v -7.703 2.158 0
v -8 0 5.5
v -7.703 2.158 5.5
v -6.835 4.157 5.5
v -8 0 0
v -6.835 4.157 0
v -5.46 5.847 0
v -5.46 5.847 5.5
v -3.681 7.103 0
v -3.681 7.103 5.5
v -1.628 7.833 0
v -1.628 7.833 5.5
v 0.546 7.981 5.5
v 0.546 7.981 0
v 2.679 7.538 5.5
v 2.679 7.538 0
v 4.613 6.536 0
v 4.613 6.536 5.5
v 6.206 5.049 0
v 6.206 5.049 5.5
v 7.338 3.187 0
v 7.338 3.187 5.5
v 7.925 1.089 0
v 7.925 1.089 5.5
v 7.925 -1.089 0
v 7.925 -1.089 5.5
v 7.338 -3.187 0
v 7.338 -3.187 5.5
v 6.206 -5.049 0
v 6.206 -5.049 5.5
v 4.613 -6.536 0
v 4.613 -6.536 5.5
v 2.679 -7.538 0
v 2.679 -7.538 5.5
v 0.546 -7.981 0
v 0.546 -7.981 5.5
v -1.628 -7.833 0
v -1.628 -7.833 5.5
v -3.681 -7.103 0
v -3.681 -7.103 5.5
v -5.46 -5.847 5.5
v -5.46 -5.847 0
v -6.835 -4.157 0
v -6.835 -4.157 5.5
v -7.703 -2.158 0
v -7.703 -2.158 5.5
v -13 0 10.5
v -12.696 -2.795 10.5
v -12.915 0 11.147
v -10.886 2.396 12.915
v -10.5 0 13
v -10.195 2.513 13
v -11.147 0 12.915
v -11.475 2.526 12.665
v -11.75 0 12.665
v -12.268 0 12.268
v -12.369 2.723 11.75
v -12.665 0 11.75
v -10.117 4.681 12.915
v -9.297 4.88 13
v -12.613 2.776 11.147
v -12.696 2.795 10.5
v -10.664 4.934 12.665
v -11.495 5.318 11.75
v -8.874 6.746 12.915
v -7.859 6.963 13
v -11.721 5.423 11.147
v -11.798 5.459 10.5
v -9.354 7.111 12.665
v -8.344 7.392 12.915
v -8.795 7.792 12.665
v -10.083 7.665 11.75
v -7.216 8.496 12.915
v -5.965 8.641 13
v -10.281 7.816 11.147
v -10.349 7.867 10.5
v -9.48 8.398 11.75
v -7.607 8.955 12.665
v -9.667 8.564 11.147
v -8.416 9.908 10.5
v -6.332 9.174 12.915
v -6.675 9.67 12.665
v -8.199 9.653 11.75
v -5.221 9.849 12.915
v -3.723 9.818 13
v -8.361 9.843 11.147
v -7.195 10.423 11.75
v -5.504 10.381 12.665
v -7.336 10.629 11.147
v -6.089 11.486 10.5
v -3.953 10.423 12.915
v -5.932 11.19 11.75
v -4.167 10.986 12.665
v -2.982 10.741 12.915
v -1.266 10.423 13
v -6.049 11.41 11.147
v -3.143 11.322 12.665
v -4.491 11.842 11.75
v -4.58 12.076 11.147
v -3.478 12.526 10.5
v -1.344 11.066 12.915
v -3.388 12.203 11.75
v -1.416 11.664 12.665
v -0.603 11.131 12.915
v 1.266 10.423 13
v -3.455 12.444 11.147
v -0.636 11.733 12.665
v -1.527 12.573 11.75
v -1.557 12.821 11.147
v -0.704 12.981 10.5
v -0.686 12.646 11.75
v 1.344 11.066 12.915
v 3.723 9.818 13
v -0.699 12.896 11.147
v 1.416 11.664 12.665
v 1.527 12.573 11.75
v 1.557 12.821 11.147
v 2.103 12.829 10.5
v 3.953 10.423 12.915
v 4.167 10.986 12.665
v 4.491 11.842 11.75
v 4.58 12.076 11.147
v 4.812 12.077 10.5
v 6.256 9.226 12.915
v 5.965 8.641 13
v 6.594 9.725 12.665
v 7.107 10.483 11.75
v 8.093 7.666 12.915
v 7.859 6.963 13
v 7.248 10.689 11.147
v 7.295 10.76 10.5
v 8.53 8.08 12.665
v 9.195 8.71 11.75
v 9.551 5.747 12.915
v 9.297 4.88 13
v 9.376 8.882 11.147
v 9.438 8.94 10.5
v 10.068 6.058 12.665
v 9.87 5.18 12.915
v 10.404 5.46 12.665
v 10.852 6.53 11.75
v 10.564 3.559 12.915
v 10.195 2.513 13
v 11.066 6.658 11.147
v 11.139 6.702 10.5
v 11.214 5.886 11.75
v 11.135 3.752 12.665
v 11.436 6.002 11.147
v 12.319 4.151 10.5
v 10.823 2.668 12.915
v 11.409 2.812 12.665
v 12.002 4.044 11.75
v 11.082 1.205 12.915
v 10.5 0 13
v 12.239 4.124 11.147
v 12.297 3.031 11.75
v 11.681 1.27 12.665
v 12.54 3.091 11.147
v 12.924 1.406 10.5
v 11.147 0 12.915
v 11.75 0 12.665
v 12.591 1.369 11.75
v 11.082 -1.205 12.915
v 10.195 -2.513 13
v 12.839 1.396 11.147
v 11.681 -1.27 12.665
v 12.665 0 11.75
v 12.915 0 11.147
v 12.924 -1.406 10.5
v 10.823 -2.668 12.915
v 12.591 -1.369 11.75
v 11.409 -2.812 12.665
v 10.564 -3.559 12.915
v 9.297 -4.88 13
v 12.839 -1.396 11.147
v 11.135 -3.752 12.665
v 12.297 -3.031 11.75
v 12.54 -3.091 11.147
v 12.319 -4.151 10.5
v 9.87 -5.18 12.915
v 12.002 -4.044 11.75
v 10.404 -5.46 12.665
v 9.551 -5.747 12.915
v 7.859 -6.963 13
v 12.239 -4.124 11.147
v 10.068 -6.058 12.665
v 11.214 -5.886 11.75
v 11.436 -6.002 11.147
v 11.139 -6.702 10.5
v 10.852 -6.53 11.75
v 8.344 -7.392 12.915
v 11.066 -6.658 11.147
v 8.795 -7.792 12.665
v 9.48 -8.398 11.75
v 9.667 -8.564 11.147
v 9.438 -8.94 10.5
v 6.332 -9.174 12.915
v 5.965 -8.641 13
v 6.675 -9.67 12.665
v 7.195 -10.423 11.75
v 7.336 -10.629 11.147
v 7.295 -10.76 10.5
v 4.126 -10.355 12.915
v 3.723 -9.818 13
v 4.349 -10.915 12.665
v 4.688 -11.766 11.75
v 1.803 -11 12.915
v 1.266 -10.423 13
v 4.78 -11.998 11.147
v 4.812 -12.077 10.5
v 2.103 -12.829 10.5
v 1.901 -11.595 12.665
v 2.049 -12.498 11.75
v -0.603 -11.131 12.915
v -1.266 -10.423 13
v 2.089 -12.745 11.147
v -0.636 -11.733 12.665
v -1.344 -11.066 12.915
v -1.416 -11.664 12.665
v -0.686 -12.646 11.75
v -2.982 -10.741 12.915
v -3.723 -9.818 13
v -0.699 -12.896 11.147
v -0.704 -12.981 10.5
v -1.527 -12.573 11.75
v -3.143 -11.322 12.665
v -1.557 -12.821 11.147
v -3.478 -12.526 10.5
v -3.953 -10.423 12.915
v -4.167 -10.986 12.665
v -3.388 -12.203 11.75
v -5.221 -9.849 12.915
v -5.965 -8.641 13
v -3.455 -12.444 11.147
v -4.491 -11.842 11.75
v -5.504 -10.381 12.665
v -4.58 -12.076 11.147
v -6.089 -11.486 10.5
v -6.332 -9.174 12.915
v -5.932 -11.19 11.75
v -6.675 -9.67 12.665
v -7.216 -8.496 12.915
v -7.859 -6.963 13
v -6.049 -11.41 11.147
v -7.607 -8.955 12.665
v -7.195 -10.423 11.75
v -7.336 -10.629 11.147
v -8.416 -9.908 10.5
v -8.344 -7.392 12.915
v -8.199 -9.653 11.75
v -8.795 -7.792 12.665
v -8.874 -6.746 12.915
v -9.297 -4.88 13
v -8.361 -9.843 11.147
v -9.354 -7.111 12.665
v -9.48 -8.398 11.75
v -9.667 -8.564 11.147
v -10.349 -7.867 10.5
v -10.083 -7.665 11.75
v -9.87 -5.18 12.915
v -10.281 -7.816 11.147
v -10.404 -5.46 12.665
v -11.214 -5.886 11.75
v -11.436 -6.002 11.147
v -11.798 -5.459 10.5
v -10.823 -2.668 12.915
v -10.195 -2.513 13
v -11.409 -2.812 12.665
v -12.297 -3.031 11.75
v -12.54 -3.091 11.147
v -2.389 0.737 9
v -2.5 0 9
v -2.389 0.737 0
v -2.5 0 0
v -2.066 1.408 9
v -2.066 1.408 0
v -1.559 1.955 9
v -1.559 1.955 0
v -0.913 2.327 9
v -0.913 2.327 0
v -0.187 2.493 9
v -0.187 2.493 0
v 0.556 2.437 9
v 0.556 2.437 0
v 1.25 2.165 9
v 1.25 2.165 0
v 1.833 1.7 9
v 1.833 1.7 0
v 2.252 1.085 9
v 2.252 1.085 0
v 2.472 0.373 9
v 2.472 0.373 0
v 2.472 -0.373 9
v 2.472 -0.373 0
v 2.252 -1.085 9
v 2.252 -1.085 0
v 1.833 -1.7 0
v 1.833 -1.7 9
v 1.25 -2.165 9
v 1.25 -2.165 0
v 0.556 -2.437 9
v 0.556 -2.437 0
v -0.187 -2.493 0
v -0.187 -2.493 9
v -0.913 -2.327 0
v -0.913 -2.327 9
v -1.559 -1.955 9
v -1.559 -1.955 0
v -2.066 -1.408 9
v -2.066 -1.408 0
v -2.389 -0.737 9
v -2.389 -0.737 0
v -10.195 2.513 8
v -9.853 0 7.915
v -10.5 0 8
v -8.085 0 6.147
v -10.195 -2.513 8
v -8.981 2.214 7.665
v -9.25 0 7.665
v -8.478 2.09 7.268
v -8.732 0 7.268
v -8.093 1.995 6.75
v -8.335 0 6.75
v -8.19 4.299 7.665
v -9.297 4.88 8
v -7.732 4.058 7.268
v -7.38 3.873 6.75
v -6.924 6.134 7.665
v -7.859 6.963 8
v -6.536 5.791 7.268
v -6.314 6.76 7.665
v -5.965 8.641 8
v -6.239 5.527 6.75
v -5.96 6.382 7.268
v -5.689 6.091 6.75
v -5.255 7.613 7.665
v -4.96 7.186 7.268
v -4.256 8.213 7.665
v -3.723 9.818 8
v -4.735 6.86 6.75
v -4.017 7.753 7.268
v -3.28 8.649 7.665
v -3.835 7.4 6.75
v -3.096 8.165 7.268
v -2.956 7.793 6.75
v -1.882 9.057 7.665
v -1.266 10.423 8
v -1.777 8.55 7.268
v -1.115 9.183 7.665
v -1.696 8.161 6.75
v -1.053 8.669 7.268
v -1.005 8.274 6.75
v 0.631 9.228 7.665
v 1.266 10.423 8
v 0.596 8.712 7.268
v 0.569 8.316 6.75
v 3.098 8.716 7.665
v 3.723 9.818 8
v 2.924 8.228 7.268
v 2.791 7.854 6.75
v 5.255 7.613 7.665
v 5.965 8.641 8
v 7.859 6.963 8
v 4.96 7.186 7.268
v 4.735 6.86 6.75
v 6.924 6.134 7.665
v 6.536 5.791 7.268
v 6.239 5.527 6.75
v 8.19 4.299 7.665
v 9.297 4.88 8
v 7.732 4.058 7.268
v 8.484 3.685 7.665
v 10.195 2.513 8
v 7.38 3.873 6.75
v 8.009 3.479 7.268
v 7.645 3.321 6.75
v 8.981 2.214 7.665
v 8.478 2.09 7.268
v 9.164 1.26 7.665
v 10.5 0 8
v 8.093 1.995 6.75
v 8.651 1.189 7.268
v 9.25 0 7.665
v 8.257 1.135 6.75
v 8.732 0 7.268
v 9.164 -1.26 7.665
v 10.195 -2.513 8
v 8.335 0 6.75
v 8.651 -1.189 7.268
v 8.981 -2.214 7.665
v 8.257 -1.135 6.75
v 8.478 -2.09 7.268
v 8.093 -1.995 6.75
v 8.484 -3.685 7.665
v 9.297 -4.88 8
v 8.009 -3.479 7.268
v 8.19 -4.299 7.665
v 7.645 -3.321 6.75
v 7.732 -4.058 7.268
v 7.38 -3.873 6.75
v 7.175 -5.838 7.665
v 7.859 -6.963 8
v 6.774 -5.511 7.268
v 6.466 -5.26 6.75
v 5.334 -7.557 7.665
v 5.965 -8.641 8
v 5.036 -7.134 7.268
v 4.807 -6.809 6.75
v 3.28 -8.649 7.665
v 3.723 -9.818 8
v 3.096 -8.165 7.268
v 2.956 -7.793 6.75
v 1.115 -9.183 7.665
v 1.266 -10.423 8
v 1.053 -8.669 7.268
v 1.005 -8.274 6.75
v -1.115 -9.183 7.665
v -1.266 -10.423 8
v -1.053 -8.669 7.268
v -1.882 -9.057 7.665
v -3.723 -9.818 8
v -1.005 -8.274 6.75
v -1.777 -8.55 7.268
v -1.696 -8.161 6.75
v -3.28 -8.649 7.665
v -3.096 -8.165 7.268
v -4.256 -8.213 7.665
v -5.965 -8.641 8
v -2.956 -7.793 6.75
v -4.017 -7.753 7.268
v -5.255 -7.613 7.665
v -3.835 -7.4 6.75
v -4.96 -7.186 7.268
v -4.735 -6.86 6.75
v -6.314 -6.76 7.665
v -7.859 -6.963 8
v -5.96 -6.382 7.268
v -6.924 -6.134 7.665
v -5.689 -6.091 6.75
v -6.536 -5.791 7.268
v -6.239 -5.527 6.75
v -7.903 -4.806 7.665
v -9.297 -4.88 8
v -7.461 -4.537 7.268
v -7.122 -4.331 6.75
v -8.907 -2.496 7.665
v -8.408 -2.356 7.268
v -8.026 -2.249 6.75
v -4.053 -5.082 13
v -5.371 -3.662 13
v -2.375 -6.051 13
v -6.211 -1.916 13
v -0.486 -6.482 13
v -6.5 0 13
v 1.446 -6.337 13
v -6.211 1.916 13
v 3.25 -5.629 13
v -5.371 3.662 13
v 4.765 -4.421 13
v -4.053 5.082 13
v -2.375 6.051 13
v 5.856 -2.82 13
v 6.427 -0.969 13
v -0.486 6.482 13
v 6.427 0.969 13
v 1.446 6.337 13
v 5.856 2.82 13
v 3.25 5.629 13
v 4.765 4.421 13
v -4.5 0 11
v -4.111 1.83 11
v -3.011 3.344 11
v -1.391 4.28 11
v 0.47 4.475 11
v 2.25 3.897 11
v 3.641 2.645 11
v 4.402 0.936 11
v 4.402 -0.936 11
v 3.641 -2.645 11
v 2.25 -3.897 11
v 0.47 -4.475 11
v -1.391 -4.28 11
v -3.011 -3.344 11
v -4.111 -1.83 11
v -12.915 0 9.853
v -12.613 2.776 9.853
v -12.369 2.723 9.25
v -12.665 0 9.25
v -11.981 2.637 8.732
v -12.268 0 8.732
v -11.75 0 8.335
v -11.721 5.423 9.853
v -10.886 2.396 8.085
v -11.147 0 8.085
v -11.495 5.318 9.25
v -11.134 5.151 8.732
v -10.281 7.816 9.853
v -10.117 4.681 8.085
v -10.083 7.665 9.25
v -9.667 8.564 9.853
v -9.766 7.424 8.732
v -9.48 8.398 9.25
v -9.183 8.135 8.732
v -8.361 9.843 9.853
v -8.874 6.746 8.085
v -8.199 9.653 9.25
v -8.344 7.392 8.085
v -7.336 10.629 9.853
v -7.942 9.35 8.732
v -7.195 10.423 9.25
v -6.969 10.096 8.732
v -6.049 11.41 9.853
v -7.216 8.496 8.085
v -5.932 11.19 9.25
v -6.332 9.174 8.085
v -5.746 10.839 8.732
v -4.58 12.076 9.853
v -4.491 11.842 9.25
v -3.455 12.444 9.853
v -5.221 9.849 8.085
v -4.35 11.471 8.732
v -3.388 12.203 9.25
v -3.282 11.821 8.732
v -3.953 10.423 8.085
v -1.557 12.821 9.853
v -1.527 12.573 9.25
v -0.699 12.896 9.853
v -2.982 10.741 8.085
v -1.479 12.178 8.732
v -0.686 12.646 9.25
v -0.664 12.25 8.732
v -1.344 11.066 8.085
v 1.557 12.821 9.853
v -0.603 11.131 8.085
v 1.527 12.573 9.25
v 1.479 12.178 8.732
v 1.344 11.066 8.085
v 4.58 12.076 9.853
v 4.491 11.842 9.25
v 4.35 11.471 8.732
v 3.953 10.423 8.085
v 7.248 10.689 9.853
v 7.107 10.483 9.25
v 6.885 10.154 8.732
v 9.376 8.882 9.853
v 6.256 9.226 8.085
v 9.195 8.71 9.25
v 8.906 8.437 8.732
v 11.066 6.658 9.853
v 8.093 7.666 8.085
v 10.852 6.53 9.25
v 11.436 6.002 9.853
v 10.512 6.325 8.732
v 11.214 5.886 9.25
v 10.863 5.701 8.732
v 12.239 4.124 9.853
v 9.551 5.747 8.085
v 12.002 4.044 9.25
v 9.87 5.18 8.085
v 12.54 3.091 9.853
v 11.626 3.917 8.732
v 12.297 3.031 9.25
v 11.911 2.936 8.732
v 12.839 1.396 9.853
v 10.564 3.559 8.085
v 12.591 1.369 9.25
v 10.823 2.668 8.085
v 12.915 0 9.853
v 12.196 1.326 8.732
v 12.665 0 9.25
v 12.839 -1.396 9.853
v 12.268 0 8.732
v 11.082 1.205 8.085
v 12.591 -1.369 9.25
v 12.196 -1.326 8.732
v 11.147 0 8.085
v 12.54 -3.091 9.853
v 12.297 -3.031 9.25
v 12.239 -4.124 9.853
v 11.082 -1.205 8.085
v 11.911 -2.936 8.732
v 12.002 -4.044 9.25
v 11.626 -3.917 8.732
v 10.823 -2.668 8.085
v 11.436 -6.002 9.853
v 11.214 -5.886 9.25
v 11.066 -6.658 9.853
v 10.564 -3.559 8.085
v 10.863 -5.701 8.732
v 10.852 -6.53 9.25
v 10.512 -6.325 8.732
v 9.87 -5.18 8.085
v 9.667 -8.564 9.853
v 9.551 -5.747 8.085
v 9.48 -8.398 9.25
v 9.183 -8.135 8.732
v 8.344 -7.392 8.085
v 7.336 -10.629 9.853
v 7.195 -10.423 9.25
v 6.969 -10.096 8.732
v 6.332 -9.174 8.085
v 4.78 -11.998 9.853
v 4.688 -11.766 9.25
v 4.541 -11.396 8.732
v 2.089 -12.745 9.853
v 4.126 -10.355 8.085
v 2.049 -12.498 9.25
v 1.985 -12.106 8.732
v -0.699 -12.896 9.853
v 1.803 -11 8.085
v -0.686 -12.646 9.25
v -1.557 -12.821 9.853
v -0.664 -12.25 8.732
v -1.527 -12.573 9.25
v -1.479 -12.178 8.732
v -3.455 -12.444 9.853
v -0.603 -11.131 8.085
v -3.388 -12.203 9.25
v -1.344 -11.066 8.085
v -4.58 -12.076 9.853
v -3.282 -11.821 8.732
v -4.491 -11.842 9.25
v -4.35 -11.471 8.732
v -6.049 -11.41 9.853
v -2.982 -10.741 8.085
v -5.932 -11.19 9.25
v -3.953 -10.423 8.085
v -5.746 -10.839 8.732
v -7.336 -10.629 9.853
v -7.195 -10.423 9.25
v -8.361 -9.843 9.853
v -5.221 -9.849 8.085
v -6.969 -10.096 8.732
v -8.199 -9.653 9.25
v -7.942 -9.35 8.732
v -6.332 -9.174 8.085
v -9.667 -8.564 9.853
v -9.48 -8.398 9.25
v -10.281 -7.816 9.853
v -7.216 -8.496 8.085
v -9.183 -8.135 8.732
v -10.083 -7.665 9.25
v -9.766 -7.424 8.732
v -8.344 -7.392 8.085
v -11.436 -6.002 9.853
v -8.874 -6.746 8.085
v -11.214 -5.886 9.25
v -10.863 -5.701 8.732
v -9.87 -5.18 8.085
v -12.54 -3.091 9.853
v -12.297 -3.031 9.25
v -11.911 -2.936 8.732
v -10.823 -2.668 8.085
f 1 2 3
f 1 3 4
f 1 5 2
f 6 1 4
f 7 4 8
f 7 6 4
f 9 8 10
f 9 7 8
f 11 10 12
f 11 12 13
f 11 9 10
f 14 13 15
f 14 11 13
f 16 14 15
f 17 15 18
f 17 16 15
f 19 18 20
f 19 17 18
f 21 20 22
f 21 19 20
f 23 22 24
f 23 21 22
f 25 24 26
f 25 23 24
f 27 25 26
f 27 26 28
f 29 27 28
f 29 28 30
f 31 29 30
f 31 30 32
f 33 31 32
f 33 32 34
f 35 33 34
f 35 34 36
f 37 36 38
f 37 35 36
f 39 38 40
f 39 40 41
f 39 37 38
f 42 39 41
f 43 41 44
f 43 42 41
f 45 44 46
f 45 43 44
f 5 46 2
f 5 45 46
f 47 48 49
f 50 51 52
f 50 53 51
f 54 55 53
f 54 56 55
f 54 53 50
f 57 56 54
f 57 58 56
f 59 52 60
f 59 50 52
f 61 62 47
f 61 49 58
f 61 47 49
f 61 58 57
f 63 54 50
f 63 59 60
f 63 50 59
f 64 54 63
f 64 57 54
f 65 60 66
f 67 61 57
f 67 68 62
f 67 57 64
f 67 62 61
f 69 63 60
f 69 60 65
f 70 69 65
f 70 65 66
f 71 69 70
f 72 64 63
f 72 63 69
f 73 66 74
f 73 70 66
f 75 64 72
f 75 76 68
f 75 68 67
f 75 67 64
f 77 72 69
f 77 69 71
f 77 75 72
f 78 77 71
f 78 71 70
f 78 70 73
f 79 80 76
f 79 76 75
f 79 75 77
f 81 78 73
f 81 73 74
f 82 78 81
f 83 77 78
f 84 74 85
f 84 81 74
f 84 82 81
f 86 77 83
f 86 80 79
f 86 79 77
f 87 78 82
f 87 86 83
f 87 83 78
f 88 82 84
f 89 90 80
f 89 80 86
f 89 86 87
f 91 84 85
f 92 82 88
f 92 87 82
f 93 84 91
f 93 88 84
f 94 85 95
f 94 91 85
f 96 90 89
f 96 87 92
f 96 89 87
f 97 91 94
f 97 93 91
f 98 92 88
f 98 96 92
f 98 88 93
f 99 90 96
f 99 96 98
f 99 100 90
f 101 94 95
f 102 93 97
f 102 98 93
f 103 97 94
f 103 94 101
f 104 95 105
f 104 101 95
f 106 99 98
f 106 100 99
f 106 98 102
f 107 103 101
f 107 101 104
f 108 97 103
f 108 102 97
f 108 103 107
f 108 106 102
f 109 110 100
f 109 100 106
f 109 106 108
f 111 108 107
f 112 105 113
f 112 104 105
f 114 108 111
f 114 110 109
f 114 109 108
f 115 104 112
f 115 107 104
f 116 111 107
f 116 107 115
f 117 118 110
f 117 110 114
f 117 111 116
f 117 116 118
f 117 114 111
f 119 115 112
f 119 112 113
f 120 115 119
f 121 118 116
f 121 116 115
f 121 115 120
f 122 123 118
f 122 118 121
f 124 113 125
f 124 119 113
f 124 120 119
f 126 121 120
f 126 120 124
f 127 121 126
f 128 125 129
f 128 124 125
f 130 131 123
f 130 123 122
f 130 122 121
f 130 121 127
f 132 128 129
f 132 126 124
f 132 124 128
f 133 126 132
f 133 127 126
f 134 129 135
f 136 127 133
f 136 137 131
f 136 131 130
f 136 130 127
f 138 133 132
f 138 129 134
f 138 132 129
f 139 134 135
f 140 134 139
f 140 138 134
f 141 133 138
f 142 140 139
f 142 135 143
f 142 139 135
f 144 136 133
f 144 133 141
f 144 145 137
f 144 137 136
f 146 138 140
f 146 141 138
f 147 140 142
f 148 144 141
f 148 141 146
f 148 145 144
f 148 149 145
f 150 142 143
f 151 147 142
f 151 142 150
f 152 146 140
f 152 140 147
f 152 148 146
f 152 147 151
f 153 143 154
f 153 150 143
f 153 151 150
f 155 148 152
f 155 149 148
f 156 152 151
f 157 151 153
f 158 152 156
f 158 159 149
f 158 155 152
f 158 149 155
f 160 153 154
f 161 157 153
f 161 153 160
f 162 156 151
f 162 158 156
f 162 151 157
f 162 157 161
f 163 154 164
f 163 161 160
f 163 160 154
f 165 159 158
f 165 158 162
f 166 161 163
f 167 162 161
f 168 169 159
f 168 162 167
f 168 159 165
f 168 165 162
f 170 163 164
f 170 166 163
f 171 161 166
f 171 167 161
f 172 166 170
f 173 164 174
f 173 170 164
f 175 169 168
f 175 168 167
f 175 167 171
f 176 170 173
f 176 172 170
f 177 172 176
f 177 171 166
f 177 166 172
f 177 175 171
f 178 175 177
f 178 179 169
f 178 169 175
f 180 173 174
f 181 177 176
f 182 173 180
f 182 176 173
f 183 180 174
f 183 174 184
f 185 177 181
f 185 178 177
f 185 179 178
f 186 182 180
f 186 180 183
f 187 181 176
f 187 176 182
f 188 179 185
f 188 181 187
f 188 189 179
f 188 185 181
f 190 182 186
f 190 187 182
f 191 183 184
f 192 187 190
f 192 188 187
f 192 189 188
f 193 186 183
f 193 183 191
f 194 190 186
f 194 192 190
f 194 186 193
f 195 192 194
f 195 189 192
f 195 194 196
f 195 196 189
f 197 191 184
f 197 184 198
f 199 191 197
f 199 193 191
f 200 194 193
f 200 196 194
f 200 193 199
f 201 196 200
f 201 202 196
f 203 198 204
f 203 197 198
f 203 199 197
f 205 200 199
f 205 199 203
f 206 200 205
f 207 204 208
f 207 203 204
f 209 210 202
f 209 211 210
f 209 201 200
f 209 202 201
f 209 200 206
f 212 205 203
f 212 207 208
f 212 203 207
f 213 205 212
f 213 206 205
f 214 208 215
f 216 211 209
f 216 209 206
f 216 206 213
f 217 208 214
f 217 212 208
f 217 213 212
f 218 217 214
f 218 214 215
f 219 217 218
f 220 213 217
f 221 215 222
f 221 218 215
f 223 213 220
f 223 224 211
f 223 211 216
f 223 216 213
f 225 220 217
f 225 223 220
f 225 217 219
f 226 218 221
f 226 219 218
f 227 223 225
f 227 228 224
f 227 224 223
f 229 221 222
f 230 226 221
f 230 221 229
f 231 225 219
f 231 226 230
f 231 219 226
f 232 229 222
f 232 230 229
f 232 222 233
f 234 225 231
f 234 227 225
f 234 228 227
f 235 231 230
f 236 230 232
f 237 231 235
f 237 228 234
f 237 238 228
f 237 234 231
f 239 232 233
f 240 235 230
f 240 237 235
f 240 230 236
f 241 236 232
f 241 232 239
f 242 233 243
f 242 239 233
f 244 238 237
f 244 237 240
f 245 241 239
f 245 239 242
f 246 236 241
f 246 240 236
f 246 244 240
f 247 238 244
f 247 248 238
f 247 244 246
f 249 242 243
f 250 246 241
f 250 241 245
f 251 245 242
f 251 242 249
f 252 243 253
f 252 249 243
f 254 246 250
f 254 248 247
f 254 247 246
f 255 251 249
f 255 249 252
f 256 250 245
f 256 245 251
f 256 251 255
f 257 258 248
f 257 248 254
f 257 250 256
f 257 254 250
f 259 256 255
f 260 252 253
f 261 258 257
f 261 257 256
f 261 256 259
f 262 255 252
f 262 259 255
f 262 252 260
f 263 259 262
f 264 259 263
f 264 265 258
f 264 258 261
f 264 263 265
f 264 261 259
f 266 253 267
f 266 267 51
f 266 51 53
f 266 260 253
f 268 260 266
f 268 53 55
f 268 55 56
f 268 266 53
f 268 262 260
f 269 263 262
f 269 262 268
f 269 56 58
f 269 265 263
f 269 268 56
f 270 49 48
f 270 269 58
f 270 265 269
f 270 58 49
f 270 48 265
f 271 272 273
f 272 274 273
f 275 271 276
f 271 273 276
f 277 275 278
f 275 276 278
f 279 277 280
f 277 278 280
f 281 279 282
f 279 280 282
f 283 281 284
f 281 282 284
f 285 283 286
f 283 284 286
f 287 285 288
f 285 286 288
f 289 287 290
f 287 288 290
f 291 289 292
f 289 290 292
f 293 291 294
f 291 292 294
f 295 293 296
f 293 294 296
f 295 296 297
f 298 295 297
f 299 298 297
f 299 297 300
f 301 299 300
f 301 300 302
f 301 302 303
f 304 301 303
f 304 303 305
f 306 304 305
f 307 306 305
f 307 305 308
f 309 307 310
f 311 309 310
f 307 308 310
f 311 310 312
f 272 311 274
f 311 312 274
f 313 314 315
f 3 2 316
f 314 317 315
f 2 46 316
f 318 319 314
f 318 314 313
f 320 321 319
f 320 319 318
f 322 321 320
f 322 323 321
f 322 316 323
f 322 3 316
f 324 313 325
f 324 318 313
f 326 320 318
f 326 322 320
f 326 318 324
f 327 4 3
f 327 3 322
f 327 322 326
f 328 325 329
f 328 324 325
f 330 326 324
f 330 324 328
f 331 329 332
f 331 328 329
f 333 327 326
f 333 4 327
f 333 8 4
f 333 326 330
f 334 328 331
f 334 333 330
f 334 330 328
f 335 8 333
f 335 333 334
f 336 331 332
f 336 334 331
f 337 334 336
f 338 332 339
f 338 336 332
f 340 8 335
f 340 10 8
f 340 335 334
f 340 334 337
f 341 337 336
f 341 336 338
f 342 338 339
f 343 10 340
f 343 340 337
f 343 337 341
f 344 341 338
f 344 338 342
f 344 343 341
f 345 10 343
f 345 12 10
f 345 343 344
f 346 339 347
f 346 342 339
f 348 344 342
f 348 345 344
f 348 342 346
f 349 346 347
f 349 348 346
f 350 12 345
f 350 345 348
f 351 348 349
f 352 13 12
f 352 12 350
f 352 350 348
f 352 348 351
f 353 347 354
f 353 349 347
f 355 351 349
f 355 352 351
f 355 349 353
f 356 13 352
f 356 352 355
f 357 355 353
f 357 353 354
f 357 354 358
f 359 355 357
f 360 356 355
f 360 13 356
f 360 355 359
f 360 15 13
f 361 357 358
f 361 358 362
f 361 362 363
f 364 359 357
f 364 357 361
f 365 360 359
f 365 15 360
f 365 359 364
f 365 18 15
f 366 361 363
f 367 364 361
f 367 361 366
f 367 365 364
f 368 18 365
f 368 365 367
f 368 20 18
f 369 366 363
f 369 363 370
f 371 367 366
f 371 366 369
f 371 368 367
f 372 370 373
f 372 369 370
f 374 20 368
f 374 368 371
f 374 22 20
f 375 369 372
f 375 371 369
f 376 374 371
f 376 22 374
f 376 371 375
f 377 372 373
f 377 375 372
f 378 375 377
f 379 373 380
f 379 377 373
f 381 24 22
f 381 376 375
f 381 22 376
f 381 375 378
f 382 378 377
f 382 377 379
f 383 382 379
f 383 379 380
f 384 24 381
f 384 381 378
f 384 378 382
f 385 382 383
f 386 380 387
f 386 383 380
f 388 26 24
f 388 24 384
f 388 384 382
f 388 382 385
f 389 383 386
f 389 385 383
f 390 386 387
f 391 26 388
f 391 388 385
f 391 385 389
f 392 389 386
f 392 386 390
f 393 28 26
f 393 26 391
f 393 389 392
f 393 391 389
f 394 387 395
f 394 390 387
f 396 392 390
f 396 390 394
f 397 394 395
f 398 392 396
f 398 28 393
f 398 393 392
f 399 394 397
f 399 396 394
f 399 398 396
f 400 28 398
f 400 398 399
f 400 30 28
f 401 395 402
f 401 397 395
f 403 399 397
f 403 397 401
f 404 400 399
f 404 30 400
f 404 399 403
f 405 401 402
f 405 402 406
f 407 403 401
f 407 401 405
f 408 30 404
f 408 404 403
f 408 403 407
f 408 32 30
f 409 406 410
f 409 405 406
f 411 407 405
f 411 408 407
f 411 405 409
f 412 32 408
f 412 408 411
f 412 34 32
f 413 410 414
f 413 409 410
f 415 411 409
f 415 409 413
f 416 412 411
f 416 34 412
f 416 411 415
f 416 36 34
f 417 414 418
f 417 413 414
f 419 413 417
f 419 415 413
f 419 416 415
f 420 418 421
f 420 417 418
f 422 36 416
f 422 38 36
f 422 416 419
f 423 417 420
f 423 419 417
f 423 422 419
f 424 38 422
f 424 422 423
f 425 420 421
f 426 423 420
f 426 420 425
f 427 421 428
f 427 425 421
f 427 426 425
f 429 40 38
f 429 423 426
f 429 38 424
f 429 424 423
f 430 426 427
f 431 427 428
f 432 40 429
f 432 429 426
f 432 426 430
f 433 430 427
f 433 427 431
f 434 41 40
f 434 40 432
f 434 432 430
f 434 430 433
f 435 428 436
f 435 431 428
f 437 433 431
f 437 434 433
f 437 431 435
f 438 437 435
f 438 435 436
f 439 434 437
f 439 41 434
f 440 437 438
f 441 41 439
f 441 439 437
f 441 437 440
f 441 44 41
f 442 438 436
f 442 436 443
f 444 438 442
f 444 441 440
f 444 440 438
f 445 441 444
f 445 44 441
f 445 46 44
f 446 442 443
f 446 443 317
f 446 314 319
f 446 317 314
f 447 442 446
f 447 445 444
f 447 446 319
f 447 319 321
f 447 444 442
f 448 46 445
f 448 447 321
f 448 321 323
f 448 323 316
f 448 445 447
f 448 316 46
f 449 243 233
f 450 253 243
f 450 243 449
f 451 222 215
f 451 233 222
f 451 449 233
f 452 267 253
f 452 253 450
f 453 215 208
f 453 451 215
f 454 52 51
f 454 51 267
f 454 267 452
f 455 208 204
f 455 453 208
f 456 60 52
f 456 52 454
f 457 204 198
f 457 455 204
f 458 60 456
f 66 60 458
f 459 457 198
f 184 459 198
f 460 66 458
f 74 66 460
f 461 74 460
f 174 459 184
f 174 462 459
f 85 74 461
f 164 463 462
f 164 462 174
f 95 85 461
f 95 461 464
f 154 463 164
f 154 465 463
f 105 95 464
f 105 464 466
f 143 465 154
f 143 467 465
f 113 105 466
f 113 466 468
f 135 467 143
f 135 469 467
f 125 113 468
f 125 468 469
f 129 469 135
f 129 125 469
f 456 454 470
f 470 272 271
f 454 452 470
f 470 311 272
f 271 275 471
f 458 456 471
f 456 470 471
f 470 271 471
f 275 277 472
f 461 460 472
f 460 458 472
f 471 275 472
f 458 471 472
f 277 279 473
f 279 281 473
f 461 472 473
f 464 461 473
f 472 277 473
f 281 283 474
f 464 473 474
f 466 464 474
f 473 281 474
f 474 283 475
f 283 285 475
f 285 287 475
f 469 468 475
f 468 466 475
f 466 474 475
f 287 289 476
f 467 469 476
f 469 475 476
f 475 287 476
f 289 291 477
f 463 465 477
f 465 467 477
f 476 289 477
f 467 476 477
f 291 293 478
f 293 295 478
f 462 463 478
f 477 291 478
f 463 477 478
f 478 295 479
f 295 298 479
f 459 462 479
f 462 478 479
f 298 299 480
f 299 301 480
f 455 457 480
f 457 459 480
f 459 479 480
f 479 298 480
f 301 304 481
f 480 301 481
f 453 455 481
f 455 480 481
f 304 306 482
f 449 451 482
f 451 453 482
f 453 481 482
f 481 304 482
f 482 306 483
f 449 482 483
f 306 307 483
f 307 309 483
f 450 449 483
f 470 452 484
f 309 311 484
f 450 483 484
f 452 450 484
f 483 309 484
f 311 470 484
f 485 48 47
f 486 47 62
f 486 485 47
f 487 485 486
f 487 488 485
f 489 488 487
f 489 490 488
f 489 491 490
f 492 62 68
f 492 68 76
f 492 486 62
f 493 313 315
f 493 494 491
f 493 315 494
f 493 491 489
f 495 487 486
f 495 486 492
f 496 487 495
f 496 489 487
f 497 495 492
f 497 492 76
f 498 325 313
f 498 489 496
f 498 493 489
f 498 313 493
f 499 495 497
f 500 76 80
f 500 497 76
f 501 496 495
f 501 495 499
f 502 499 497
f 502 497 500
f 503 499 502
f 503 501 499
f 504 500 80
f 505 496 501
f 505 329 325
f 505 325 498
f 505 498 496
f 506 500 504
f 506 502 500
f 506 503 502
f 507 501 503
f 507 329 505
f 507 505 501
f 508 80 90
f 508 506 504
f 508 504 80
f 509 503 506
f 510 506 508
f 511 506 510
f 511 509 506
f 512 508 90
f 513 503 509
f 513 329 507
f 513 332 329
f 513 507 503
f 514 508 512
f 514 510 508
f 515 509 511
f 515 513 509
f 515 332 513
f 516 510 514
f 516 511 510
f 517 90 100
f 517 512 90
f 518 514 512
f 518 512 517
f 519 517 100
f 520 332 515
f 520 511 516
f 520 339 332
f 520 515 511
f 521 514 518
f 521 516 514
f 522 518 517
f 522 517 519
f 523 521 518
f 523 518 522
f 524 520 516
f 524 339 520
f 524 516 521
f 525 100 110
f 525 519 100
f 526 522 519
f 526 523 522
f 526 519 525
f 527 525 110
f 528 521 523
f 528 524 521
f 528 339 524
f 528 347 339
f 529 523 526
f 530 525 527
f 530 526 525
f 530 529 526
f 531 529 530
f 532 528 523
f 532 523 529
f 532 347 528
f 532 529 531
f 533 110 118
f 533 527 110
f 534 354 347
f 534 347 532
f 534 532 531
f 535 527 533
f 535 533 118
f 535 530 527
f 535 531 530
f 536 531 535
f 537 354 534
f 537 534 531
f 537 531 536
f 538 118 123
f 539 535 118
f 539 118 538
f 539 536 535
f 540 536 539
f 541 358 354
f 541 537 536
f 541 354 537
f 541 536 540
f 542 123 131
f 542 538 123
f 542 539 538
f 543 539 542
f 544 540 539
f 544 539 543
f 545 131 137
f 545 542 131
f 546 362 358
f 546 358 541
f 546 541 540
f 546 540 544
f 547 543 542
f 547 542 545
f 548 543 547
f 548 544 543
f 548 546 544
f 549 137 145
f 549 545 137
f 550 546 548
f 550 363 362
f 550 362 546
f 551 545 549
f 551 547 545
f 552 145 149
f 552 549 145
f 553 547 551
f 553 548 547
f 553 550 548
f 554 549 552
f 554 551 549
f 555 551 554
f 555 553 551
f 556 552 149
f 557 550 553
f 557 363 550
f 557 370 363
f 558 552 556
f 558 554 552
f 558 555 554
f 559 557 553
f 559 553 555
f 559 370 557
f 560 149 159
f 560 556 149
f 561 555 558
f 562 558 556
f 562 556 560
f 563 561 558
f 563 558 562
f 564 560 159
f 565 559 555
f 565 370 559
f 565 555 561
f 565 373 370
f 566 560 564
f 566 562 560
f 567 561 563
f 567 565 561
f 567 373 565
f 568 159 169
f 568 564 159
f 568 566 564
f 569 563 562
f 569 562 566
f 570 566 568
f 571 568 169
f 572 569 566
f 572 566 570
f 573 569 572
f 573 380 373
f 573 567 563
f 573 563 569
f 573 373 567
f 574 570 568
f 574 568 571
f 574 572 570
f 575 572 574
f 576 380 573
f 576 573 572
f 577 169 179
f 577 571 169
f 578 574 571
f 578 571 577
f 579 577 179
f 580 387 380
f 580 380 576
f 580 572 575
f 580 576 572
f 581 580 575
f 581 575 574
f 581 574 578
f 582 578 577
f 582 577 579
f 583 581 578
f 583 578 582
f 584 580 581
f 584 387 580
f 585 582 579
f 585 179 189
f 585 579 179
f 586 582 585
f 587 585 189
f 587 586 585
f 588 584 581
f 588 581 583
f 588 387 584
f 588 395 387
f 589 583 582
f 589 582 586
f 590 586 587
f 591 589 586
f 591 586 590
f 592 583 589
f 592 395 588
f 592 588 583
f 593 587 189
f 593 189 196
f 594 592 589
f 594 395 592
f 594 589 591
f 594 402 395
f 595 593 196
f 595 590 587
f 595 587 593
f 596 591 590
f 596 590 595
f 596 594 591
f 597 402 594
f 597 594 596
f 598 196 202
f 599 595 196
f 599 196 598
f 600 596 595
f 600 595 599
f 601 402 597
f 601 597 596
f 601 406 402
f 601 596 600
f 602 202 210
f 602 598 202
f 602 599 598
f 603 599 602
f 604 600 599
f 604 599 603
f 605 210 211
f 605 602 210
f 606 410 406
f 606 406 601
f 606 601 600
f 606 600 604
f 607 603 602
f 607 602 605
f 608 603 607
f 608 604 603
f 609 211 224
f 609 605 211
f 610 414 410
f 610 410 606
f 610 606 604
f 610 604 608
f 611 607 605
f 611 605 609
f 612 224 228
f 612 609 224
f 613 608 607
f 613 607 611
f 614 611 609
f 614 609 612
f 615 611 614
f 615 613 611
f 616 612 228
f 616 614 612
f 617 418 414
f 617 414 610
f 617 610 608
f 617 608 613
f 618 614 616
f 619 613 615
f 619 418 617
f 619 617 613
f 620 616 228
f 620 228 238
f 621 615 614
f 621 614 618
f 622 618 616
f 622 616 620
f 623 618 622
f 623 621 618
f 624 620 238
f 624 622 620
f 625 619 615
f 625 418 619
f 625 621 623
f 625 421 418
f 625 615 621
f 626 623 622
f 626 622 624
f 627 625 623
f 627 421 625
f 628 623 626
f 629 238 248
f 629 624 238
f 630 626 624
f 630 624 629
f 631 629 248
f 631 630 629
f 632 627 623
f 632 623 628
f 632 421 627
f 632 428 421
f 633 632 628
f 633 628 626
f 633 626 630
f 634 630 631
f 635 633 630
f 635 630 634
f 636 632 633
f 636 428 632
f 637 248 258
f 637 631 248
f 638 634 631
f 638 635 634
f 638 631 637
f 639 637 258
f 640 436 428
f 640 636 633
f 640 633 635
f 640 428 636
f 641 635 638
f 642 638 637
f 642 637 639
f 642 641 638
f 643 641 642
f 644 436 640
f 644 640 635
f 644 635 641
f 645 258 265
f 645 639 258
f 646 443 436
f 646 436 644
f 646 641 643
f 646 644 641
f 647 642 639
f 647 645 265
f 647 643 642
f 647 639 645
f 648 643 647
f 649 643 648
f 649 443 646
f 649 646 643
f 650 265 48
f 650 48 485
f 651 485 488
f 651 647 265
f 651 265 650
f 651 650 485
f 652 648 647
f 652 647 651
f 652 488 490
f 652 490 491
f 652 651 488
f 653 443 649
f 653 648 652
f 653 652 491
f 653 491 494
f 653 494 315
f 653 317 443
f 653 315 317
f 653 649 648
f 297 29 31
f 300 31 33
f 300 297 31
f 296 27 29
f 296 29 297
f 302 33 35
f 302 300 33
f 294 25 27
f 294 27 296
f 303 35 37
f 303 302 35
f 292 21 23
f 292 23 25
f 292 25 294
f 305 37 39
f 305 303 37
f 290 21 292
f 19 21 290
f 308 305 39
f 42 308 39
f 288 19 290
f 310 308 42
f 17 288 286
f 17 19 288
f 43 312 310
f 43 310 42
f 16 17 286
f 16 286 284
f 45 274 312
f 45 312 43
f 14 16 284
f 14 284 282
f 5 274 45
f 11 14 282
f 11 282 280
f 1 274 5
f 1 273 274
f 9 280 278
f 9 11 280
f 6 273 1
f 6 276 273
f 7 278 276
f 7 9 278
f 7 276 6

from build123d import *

# Parameters (mm, degrees)
F3_D           = 5
F3_CSINK_D     = 13
F3_CSINK_ANGLE = 90


with BuildPart() as f1:
    # F0 (on Front) → F1 (revolve)
    with BuildSketch(Plane.XZ):
        with BuildLine():
            Line((-8, 0), (0, 0))
            Line((0, 0), (0, 13))
            Line((0, 13), (-10.5, 13))
            ThreePointArc((-10.5, 13), (-12.267767, 12.267767), (-13, 10.5))
            ThreePointArc((-13, 10.5), (-12.267767, 8.732233), (-10.5, 8))
            ThreePointArc((-10.5, 8), (-8.732233, 7.267767), (-8, 5.5))
            Line((-8, 5.5), (-8, 0))
        make_face()
    revolve(axis=Axis((0, 0, 6.5), (0, 0, -1)))

    # F3 (through all)
    with Locations(Plane.XY.offset(13)):
        with Locations((0, 0)):
            CounterSinkHole(F3_D / 2, F3_CSINK_D / 2, counter_sink_angle=F3_CSINK_ANGLE)


solid = f1.part
